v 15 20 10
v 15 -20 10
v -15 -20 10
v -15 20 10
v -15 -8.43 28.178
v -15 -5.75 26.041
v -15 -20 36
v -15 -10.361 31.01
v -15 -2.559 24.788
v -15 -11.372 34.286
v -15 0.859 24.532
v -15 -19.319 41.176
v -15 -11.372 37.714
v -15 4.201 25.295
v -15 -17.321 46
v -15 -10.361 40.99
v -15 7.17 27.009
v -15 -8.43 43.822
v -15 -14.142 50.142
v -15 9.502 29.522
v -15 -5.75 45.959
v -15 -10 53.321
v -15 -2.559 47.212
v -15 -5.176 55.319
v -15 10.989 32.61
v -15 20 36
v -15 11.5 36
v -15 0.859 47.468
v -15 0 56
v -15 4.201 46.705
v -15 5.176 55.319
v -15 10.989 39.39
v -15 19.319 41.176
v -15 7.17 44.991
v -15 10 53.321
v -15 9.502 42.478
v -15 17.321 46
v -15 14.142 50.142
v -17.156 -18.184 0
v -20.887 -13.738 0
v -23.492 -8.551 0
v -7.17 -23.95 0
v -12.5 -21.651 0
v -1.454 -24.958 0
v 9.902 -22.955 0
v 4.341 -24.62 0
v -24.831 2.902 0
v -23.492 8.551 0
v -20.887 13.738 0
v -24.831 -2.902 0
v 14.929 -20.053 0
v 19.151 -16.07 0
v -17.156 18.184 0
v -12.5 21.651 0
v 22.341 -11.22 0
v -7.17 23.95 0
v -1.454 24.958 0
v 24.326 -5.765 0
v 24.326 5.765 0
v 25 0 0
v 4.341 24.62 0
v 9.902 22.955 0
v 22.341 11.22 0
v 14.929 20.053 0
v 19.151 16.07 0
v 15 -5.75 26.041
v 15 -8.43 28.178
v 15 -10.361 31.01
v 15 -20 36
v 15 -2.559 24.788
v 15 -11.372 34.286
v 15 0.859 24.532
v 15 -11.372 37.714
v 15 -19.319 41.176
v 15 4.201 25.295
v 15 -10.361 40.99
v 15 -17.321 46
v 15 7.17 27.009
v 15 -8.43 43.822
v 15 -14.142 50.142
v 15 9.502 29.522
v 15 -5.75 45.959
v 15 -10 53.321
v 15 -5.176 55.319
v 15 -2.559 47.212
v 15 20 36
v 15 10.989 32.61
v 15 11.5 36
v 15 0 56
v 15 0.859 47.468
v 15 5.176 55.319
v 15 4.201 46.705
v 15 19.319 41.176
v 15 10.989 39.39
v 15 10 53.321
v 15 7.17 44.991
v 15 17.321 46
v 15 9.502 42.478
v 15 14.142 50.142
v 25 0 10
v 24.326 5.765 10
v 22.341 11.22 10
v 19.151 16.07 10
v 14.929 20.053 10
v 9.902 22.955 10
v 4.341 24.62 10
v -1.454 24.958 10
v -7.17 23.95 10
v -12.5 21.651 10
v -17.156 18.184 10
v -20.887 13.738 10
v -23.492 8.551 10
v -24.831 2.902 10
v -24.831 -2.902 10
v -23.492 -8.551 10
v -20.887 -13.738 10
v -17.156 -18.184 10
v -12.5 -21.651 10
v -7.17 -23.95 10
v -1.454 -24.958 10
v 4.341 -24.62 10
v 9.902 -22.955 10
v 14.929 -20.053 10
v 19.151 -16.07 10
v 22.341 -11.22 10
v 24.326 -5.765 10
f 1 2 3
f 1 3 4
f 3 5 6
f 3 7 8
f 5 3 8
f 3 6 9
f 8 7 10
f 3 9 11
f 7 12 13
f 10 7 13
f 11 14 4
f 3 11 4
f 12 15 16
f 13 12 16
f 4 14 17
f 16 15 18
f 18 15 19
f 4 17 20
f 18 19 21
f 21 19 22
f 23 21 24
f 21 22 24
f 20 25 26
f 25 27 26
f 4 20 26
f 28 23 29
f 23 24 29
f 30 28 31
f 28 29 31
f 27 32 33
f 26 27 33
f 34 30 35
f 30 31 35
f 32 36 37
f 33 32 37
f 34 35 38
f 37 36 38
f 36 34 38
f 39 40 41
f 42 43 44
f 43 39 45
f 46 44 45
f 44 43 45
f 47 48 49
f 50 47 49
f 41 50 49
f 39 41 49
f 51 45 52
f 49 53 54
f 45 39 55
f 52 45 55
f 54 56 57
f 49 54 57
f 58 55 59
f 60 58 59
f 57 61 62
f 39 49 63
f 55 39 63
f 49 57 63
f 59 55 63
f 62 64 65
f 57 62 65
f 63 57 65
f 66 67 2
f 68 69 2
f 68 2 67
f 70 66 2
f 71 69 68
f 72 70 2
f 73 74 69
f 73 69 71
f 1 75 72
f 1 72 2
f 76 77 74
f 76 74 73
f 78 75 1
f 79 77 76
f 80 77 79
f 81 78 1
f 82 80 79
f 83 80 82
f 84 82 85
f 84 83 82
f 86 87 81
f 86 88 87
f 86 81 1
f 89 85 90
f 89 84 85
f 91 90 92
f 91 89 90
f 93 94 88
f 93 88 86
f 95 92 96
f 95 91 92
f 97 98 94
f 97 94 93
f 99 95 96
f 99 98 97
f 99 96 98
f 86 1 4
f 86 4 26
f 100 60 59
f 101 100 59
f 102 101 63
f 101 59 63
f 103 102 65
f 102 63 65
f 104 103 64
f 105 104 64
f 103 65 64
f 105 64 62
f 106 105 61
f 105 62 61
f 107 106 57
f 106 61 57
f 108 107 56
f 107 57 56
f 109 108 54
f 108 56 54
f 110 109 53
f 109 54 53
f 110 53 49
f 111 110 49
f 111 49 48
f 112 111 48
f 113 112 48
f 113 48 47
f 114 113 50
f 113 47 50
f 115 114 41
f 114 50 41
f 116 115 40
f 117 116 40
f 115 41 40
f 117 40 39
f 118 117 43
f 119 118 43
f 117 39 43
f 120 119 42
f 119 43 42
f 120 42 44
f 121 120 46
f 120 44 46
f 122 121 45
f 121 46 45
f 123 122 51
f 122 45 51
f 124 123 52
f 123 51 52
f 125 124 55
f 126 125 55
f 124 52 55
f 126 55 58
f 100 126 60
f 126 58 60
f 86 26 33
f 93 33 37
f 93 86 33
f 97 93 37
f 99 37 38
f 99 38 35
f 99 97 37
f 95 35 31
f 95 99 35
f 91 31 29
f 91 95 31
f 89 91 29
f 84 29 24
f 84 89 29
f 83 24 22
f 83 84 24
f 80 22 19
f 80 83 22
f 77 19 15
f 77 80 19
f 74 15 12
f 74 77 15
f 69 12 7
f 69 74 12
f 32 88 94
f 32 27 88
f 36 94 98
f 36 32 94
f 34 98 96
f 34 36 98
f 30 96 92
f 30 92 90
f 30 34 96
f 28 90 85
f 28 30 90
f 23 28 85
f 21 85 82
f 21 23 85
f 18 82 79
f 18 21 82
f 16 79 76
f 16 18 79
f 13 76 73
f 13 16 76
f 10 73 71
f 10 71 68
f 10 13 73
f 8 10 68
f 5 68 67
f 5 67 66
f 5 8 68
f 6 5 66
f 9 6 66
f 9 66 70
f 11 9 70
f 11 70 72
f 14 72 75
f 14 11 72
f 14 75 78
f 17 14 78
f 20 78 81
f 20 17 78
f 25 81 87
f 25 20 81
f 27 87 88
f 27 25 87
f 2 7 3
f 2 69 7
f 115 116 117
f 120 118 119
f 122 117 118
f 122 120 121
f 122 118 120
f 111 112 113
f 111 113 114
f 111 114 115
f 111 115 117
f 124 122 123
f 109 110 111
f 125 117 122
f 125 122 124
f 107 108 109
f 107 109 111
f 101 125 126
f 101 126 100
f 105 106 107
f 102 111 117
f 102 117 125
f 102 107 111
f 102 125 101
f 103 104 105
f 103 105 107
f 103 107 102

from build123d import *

# Parameters (mm, degrees)
F0_R     = 25
F1_DEPTH = 10
F2_R     = 11.5
F3_DEPTH = 15


with BuildPart() as f1:
    # F0 (on Top) → F1 (new body)
    with BuildSketch(Plane.XY):
        Circle(F0_R)
    extrude(amount=F1_DEPTH)


with BuildPart() as f3:
    # F2 (on Right) → F3 (new body, symmetric)
    with BuildSketch(Plane.YZ):
        with BuildLine():
            Line((-20, 36), (-20, 10))
            Line((-20, 10), (20.000002, 10))
            Line((20.000002, 10), (20.000002, 36))
            ThreePointArc((20.000002, 36), (1e-06, 56.000001), (-20, 36))
        make_face()
        with Locations((1e-06, 36)):
            Circle(F2_R, mode=Mode.SUBTRACT)
    extrude(amount=F3_DEPTH, both=True)


solid = Compound([f1.part, f3.part])
